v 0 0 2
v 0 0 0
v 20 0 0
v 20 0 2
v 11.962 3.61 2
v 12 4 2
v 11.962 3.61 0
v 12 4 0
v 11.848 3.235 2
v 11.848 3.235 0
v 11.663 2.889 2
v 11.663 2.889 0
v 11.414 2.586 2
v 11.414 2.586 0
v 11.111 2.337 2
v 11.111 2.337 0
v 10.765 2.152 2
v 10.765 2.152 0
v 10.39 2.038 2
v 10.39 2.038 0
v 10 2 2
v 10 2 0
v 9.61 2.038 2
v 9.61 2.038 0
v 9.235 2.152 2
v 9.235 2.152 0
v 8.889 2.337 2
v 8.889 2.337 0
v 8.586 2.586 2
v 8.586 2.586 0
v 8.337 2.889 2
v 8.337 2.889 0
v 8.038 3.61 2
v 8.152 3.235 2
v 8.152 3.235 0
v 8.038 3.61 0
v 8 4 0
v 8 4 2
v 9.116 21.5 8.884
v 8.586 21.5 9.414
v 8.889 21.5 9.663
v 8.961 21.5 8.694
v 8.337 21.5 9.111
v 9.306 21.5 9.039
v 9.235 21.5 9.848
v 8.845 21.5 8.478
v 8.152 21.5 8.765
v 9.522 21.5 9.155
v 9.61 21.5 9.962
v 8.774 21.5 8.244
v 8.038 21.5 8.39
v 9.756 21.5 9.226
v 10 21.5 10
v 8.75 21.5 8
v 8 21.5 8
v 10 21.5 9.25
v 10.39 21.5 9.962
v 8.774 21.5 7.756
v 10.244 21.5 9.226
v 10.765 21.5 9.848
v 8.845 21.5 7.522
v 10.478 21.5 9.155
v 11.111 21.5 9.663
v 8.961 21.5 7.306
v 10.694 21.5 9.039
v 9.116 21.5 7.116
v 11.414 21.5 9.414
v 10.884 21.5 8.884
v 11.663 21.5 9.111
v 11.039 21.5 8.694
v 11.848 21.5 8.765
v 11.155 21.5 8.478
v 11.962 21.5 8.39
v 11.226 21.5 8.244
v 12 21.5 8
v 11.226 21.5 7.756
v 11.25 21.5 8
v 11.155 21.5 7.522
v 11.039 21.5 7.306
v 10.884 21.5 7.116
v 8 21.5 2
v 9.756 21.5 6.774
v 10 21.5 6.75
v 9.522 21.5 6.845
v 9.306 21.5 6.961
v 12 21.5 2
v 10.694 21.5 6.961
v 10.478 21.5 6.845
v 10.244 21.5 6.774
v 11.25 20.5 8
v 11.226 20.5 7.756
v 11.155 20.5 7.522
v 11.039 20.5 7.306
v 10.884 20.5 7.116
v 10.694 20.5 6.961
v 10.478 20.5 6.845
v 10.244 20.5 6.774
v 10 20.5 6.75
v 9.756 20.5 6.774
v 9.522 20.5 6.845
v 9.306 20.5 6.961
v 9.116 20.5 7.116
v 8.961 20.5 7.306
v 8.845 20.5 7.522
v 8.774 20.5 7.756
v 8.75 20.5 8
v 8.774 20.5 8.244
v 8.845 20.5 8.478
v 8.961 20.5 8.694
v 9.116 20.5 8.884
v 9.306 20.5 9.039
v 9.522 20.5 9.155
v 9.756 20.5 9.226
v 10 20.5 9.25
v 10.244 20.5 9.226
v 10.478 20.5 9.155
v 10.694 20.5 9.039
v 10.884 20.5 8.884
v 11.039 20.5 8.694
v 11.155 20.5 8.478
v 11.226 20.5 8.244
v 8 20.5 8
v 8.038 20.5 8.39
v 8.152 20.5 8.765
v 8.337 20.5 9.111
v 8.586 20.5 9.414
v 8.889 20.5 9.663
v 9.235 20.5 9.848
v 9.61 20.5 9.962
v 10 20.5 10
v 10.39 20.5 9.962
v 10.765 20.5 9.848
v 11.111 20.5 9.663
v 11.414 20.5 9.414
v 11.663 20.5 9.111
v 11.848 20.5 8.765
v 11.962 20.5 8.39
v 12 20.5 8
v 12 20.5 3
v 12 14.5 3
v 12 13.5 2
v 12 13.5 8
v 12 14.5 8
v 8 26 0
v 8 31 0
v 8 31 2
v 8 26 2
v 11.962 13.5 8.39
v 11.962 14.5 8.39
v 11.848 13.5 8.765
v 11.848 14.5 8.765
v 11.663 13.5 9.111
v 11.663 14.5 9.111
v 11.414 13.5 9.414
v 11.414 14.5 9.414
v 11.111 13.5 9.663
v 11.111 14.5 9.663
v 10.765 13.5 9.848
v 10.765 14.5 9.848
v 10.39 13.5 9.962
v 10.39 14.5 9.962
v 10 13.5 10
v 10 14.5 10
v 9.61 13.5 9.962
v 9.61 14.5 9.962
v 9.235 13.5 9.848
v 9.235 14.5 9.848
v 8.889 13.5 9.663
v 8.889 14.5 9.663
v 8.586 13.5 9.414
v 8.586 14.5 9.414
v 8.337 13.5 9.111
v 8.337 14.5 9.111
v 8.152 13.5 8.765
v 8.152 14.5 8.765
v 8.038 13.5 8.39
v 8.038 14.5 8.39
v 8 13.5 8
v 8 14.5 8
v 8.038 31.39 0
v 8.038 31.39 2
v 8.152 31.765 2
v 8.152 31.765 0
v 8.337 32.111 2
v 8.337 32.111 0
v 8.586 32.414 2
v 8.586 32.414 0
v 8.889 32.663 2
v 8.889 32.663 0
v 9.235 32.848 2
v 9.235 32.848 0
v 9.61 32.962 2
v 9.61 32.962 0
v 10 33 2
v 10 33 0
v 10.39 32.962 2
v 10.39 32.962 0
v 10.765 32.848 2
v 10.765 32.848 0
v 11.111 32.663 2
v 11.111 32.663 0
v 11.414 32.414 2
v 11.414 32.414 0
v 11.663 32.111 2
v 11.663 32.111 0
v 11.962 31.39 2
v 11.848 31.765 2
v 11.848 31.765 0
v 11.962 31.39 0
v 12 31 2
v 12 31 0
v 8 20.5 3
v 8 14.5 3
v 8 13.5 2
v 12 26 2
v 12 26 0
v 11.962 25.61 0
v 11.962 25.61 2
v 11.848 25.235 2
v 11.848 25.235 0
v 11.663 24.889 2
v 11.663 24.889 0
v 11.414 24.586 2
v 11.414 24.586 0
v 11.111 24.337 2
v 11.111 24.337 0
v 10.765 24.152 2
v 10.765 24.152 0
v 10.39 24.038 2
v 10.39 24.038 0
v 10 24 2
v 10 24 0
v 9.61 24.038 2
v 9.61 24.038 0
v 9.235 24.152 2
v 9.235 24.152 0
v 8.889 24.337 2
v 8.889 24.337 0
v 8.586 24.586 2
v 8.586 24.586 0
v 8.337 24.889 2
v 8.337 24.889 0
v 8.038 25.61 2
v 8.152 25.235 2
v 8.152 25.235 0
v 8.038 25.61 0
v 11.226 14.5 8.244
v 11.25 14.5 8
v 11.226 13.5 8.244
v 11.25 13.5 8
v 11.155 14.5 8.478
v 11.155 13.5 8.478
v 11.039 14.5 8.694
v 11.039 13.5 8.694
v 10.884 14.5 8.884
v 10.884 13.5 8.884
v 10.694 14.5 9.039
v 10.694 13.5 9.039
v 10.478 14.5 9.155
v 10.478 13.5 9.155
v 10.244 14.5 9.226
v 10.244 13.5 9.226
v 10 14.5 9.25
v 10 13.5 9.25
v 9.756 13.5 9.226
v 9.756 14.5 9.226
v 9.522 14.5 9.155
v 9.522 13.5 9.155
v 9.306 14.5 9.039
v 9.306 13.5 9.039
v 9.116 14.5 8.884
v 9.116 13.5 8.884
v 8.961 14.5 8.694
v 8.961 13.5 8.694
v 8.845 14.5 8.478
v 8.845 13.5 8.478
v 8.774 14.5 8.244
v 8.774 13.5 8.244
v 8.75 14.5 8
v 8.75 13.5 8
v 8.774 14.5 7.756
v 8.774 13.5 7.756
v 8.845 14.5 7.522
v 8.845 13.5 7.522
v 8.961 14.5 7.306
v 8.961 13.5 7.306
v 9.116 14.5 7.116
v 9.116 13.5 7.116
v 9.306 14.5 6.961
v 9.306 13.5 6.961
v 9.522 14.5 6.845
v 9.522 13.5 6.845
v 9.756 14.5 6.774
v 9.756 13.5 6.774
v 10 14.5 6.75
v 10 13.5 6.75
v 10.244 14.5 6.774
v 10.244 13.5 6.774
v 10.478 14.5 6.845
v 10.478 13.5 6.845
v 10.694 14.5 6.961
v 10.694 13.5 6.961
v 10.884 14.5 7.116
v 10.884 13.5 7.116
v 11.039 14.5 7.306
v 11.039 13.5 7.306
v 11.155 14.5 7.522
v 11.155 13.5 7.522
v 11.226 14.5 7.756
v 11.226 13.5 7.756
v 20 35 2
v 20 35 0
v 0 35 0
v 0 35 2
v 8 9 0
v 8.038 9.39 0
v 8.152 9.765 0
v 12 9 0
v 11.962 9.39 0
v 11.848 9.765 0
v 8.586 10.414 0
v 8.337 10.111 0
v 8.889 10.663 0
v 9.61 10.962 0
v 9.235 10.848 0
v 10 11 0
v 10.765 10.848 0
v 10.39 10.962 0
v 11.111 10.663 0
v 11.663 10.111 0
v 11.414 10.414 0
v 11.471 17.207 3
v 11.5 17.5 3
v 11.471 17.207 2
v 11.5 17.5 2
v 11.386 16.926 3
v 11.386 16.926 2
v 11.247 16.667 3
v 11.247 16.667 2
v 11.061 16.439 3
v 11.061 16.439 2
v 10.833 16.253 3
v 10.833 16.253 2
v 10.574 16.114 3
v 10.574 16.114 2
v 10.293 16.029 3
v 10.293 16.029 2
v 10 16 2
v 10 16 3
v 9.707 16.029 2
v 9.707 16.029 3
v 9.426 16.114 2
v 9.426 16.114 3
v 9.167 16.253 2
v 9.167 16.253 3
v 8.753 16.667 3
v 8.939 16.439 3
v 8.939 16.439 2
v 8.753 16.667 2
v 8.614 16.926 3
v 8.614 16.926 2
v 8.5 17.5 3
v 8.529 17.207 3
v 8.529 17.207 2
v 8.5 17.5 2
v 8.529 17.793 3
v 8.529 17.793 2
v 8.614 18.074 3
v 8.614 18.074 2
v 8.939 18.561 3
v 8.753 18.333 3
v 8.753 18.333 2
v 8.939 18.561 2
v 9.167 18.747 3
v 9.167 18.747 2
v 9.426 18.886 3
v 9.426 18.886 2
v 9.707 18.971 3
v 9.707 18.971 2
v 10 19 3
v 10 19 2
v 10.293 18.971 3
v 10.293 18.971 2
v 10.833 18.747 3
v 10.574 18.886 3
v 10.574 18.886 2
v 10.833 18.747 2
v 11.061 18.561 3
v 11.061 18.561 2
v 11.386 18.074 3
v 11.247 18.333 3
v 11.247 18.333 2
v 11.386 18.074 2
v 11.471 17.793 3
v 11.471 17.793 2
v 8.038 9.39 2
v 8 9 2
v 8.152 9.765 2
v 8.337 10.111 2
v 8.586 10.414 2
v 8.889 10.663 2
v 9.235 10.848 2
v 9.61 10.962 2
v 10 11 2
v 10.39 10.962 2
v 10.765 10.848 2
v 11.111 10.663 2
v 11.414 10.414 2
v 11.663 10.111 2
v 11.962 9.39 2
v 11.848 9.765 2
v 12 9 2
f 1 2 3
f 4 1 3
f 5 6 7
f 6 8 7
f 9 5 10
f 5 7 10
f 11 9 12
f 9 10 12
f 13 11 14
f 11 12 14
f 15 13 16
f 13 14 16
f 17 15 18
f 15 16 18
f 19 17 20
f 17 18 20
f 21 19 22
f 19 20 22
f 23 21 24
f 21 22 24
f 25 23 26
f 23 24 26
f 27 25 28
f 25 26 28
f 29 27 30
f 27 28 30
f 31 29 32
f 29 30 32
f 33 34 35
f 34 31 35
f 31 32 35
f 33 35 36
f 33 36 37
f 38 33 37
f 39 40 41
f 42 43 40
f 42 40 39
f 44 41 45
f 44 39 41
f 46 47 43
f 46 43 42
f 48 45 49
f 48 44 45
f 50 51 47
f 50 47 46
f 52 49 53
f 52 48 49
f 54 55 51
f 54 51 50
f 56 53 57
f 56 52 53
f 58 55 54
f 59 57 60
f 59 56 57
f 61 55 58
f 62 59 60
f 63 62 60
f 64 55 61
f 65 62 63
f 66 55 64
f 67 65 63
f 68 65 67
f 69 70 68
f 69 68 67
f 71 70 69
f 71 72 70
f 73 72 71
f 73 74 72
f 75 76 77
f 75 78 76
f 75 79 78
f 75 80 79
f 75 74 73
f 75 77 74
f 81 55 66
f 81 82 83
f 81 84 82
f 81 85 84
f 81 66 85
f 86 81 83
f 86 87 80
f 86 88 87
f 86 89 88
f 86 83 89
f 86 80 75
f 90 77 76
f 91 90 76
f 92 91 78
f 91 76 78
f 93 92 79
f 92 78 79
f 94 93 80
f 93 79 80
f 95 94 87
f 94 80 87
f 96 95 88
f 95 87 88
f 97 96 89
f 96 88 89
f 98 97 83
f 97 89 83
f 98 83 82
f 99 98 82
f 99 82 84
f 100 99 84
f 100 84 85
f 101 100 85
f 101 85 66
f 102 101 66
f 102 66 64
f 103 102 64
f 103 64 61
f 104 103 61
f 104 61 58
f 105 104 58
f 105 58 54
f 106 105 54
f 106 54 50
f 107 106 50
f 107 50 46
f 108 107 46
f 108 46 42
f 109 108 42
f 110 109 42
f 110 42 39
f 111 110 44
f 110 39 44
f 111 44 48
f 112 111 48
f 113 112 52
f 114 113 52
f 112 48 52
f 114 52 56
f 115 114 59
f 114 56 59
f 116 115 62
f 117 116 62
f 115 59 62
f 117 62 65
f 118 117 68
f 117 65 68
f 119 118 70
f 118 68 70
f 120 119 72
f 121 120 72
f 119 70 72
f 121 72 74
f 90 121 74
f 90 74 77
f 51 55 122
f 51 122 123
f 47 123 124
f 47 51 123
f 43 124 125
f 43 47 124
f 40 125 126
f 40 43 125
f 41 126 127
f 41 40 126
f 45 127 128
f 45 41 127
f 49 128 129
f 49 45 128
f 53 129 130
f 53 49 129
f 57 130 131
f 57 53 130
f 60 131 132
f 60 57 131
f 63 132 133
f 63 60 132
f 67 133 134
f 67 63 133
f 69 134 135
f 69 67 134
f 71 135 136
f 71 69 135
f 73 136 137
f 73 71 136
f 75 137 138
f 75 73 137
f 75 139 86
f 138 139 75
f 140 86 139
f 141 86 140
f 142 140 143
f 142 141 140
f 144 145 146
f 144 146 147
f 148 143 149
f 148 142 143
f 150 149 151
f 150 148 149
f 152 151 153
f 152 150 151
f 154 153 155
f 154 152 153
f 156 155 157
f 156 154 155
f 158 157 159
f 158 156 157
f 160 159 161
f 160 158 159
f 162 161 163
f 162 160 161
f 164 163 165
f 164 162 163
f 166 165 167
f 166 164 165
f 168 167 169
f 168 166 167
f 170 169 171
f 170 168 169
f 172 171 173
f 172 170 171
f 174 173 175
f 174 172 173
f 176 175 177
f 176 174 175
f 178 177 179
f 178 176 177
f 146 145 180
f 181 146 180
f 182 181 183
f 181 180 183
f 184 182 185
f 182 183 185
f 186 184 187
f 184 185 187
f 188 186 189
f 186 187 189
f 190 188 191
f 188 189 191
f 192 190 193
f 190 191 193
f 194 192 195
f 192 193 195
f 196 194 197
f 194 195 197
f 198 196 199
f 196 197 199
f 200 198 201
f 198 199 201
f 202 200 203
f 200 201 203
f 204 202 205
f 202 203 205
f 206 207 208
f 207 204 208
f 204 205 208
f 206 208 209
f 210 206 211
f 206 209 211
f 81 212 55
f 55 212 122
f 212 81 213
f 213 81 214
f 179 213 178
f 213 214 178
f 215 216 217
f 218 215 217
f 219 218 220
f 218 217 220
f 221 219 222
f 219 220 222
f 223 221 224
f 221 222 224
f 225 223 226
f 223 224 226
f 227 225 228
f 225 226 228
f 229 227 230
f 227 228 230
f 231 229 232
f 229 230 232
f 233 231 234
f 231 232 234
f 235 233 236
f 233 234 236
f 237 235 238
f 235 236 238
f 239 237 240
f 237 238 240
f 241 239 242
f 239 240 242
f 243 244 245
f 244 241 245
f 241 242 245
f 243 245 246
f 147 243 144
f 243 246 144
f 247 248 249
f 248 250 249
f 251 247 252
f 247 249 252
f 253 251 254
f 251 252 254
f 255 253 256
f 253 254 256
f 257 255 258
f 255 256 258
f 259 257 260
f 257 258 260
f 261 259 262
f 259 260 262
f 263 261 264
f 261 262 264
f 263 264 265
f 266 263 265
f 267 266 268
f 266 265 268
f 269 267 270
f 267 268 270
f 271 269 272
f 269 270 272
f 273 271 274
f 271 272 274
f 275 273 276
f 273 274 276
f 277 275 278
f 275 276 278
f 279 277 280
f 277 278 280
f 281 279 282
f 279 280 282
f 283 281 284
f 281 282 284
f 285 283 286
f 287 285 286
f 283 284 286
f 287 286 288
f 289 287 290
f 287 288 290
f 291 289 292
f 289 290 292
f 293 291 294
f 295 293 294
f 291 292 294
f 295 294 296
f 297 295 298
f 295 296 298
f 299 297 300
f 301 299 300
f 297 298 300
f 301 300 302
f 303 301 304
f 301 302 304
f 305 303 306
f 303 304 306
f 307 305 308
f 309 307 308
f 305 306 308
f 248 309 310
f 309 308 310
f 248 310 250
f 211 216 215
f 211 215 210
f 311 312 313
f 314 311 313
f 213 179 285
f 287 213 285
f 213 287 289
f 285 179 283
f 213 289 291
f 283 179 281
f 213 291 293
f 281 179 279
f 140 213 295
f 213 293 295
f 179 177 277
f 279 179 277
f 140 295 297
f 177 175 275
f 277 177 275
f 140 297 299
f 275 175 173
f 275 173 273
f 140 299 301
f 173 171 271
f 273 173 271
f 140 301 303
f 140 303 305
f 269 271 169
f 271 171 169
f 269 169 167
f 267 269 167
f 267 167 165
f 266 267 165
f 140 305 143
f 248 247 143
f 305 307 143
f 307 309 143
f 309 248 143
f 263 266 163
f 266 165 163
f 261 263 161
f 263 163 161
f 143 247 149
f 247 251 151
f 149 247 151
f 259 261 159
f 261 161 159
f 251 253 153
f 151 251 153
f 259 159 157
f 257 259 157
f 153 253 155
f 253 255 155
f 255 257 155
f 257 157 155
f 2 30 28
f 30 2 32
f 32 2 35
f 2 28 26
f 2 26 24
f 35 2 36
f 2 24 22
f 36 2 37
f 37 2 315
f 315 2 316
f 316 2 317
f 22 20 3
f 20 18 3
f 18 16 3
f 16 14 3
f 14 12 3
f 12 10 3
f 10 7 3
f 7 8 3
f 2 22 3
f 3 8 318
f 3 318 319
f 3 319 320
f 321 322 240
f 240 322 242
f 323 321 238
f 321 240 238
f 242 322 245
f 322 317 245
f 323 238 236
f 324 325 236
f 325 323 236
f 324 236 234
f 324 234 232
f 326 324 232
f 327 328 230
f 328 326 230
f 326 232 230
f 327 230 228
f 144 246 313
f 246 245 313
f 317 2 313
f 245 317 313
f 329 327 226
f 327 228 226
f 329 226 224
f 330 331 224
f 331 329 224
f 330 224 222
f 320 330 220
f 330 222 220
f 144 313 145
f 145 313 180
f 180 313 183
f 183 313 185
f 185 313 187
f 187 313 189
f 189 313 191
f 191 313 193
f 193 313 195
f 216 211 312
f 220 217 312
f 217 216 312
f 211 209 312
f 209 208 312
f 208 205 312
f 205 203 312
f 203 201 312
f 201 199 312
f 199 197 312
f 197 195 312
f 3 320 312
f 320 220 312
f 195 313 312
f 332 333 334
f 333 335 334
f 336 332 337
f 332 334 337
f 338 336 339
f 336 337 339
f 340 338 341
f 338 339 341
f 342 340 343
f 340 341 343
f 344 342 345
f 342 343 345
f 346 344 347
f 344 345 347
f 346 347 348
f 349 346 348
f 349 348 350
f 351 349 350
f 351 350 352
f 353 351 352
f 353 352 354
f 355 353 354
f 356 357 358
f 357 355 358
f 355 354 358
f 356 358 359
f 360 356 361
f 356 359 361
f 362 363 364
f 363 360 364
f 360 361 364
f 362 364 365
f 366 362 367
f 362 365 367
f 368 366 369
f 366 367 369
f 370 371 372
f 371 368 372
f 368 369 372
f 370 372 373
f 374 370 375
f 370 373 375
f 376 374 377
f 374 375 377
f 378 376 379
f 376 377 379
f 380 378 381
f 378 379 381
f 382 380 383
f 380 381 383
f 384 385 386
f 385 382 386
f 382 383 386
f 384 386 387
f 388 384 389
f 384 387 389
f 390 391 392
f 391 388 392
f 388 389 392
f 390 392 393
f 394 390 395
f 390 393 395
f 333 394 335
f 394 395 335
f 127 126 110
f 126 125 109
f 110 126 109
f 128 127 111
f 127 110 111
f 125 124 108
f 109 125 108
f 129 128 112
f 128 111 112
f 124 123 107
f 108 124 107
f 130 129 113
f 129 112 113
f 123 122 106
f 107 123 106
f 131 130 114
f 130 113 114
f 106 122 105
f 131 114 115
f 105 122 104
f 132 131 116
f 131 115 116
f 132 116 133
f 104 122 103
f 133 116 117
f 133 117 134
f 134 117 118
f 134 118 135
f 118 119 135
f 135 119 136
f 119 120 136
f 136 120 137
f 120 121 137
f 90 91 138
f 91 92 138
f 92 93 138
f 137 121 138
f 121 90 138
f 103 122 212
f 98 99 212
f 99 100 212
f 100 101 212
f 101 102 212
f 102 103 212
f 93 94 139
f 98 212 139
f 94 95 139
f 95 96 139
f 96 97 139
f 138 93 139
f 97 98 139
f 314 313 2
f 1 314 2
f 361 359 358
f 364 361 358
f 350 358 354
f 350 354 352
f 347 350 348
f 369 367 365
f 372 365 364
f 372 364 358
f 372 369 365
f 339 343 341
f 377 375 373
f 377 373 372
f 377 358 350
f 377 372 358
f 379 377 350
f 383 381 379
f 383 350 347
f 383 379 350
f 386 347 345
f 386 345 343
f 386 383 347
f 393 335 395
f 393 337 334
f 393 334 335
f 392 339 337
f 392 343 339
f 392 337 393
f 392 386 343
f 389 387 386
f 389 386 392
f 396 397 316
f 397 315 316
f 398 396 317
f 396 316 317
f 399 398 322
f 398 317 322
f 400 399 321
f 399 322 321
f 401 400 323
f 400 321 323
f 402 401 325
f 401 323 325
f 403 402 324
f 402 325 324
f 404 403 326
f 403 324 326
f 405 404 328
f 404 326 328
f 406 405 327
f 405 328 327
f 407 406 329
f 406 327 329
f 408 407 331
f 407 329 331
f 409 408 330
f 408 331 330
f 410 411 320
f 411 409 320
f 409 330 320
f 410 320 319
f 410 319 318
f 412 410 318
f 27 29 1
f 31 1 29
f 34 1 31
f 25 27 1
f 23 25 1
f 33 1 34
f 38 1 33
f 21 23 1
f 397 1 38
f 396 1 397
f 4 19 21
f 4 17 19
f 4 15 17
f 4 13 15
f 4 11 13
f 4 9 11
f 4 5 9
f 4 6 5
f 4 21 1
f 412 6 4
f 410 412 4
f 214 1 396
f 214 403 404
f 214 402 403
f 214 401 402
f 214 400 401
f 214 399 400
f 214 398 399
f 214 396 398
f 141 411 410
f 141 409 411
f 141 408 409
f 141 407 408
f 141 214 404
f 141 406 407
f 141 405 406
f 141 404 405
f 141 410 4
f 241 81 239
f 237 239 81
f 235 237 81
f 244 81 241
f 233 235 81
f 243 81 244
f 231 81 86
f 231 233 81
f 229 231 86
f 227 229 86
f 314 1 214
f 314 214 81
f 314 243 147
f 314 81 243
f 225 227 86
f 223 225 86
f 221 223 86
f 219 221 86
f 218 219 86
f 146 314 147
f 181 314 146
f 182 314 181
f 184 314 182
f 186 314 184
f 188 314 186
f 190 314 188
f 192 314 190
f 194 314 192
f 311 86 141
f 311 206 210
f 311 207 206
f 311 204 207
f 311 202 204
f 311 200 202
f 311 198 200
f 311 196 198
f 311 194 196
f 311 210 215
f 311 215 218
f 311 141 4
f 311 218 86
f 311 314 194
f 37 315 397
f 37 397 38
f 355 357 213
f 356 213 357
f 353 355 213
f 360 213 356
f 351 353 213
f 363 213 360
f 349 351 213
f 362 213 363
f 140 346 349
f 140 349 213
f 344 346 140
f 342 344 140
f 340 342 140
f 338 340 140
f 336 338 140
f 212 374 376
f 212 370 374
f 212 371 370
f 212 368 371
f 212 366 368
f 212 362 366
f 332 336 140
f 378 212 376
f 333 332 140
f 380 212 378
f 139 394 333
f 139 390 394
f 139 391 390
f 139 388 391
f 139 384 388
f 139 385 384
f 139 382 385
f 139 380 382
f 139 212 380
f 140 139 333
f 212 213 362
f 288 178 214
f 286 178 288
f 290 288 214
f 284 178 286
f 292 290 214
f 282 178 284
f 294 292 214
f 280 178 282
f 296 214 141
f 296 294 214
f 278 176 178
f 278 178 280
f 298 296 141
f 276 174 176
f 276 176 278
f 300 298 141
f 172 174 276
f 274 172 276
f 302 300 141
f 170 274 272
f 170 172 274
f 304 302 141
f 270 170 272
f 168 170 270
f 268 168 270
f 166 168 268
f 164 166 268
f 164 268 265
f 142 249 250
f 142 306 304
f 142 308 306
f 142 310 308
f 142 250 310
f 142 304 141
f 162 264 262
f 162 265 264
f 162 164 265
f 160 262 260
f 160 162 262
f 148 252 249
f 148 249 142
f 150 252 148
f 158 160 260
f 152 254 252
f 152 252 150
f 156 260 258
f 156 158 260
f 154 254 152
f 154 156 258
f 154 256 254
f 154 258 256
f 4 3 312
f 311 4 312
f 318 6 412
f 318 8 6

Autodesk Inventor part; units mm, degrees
ref_plane "YZ Plane" through (0, 0, 0) normal (1, 0, 0) x (0, 1, 0)
ref_plane "XZ Plane" through (0, 0, 0) normal (0, 1, 0) x (-1, 0, 0)
ref_plane "XY Plane" through (0, 0, 0) normal (0, 0, 1) x (1, 0, 0)
sketch "Boceto1" plane through (0, 0, 0) normal (0, 0, 1) x (1, 0, 0)
  line L0 (0, 0) -> (20, 0)
  line L1 (20, 0) -> (20, 35)
  line L2 (20, 35) -> (0, 35)
  line L3 (0, 35) -> (0, 0)
  line L4 (10, 31) -> (10, 26) construction
  line L5 (8, 31) -> (8, 26)
  line L6 (12, 26) -> (12, 31)
  arc A0 (12, 31) -> (8, 31) centre (10, 31) ccw
  arc A1 (8, 26) -> (12, 26) centre (10, 26) ccw
  line L7 (10, 4) -> (10, 9) construction
  line L8 (12, 4) -> (12, 9)
  line L9 (8, 9) -> (8, 4)
  arc A2 (8, 4) -> (12, 4) centre (10, 4) ccw
  arc A3 (12, 9) -> (8, 9) centre (10, 9) ccw
  point P0 (10, 28.5)
  point P1 (10, 6.5)
  point P2 (10, 33)
  point P3 (10, 2)
  point P4 (10, 11)
  point P5 (10, 24)
  dimension "d0" = 20
  dimension "d1" = 35
  dimension "d2" = 5
  dimension "d3" = 4
  dimension "d4" = 5
  dimension "d5" = 4
  dimension "d6" = 2
  dimension "d7" = 2
  dimension "d8" = 13
extrude "Extrusión1" add sketch "Boceto1" along normal blind 2
sketch "Boceto2" plane through (0, 0, 2) normal (0, 0, 1) x (1, 0, 0)
  line L0 (8, 26) -> (8, 31) projected
  line L1 (12, 31) -> (12, 26) projected
  line L2 (8, 21.5) -> (12, 21.5)
  line L3 (12, 21.5) -> (12, 13.5)
  line L4 (12, 13.5) -> (8, 13.5)
  line L5 (8, 13.5) -> (8, 21.5)
  arc A0 (8, 26) -> (12, 26) centre (10, 26) ccw projected
  arc A1 (12, 9) -> (8, 9) centre (10, 9) ccw projected
  circle A2 centre (10, 17.5) radius 1.5
  point P0 (0, 0)
  point P1 (10, 21.5)
  point P2 (10, 24)
  point P3 (10, 13.5)
  point P4 (10, 11)
  dimension "d11" = 4
  dimension "d12" = 8
  dimension "d13" = 2.5
  dimension "d15" = 3
extrude "Extrusión2" add sketch "Boceto2" along normal blind 1
sketch "Boceto3" plane through (8, 21.5, 2) normal (0, 1, 0) x (1, 0, 0)
  line L0 (0, -1) -> (0, -6)
  line L1 (4, -1) -> (4, -6)
  arc A0 (0, -6) -> (4, -6) centre (2, -6) ccw
  circle A1 centre (2, -6) radius 1.25
  line L2 (0, -1) -> (4, -1) projected
  line L3 (0, -1) -> (4, -1)
  point P0 (-8, 2)
  dimension "d18" = 5
  dimension "d19" = 5
  dimension "d20" = 2
  dimension "d21" = 2.5
extrude "Extrusión3" add sketch "Boceto3" against normal blind 1
sketch "Boceto4" plane through (8, 13.5, 2) normal (0, -1, 0) x (1, 0, 0)
  line L0 (0, 0) -> (0, 6) projected
  line L1 (0, 1) -> (0, 6)
  line L2 (4, 0) -> (4, 1) projected
  line L3 (4, 1) -> (4, 6) projected
  line L4 (4, 1) -> (4, 6)
  arc A0 (4, 6) -> (0, 6) centre (2, 6) ccw
  circle A1 centre (2, 6) radius 1.25
  line L5 (0, 1) -> (4, 1) projected
  line L6 (0, 1) -> (4, 1)
  point P0 (-8, -2)
  dimension "d25" = 2.5
extrude "Extrusión4" add sketch "Boceto4" against normal blind 1
properties part number "soporte_polea"
